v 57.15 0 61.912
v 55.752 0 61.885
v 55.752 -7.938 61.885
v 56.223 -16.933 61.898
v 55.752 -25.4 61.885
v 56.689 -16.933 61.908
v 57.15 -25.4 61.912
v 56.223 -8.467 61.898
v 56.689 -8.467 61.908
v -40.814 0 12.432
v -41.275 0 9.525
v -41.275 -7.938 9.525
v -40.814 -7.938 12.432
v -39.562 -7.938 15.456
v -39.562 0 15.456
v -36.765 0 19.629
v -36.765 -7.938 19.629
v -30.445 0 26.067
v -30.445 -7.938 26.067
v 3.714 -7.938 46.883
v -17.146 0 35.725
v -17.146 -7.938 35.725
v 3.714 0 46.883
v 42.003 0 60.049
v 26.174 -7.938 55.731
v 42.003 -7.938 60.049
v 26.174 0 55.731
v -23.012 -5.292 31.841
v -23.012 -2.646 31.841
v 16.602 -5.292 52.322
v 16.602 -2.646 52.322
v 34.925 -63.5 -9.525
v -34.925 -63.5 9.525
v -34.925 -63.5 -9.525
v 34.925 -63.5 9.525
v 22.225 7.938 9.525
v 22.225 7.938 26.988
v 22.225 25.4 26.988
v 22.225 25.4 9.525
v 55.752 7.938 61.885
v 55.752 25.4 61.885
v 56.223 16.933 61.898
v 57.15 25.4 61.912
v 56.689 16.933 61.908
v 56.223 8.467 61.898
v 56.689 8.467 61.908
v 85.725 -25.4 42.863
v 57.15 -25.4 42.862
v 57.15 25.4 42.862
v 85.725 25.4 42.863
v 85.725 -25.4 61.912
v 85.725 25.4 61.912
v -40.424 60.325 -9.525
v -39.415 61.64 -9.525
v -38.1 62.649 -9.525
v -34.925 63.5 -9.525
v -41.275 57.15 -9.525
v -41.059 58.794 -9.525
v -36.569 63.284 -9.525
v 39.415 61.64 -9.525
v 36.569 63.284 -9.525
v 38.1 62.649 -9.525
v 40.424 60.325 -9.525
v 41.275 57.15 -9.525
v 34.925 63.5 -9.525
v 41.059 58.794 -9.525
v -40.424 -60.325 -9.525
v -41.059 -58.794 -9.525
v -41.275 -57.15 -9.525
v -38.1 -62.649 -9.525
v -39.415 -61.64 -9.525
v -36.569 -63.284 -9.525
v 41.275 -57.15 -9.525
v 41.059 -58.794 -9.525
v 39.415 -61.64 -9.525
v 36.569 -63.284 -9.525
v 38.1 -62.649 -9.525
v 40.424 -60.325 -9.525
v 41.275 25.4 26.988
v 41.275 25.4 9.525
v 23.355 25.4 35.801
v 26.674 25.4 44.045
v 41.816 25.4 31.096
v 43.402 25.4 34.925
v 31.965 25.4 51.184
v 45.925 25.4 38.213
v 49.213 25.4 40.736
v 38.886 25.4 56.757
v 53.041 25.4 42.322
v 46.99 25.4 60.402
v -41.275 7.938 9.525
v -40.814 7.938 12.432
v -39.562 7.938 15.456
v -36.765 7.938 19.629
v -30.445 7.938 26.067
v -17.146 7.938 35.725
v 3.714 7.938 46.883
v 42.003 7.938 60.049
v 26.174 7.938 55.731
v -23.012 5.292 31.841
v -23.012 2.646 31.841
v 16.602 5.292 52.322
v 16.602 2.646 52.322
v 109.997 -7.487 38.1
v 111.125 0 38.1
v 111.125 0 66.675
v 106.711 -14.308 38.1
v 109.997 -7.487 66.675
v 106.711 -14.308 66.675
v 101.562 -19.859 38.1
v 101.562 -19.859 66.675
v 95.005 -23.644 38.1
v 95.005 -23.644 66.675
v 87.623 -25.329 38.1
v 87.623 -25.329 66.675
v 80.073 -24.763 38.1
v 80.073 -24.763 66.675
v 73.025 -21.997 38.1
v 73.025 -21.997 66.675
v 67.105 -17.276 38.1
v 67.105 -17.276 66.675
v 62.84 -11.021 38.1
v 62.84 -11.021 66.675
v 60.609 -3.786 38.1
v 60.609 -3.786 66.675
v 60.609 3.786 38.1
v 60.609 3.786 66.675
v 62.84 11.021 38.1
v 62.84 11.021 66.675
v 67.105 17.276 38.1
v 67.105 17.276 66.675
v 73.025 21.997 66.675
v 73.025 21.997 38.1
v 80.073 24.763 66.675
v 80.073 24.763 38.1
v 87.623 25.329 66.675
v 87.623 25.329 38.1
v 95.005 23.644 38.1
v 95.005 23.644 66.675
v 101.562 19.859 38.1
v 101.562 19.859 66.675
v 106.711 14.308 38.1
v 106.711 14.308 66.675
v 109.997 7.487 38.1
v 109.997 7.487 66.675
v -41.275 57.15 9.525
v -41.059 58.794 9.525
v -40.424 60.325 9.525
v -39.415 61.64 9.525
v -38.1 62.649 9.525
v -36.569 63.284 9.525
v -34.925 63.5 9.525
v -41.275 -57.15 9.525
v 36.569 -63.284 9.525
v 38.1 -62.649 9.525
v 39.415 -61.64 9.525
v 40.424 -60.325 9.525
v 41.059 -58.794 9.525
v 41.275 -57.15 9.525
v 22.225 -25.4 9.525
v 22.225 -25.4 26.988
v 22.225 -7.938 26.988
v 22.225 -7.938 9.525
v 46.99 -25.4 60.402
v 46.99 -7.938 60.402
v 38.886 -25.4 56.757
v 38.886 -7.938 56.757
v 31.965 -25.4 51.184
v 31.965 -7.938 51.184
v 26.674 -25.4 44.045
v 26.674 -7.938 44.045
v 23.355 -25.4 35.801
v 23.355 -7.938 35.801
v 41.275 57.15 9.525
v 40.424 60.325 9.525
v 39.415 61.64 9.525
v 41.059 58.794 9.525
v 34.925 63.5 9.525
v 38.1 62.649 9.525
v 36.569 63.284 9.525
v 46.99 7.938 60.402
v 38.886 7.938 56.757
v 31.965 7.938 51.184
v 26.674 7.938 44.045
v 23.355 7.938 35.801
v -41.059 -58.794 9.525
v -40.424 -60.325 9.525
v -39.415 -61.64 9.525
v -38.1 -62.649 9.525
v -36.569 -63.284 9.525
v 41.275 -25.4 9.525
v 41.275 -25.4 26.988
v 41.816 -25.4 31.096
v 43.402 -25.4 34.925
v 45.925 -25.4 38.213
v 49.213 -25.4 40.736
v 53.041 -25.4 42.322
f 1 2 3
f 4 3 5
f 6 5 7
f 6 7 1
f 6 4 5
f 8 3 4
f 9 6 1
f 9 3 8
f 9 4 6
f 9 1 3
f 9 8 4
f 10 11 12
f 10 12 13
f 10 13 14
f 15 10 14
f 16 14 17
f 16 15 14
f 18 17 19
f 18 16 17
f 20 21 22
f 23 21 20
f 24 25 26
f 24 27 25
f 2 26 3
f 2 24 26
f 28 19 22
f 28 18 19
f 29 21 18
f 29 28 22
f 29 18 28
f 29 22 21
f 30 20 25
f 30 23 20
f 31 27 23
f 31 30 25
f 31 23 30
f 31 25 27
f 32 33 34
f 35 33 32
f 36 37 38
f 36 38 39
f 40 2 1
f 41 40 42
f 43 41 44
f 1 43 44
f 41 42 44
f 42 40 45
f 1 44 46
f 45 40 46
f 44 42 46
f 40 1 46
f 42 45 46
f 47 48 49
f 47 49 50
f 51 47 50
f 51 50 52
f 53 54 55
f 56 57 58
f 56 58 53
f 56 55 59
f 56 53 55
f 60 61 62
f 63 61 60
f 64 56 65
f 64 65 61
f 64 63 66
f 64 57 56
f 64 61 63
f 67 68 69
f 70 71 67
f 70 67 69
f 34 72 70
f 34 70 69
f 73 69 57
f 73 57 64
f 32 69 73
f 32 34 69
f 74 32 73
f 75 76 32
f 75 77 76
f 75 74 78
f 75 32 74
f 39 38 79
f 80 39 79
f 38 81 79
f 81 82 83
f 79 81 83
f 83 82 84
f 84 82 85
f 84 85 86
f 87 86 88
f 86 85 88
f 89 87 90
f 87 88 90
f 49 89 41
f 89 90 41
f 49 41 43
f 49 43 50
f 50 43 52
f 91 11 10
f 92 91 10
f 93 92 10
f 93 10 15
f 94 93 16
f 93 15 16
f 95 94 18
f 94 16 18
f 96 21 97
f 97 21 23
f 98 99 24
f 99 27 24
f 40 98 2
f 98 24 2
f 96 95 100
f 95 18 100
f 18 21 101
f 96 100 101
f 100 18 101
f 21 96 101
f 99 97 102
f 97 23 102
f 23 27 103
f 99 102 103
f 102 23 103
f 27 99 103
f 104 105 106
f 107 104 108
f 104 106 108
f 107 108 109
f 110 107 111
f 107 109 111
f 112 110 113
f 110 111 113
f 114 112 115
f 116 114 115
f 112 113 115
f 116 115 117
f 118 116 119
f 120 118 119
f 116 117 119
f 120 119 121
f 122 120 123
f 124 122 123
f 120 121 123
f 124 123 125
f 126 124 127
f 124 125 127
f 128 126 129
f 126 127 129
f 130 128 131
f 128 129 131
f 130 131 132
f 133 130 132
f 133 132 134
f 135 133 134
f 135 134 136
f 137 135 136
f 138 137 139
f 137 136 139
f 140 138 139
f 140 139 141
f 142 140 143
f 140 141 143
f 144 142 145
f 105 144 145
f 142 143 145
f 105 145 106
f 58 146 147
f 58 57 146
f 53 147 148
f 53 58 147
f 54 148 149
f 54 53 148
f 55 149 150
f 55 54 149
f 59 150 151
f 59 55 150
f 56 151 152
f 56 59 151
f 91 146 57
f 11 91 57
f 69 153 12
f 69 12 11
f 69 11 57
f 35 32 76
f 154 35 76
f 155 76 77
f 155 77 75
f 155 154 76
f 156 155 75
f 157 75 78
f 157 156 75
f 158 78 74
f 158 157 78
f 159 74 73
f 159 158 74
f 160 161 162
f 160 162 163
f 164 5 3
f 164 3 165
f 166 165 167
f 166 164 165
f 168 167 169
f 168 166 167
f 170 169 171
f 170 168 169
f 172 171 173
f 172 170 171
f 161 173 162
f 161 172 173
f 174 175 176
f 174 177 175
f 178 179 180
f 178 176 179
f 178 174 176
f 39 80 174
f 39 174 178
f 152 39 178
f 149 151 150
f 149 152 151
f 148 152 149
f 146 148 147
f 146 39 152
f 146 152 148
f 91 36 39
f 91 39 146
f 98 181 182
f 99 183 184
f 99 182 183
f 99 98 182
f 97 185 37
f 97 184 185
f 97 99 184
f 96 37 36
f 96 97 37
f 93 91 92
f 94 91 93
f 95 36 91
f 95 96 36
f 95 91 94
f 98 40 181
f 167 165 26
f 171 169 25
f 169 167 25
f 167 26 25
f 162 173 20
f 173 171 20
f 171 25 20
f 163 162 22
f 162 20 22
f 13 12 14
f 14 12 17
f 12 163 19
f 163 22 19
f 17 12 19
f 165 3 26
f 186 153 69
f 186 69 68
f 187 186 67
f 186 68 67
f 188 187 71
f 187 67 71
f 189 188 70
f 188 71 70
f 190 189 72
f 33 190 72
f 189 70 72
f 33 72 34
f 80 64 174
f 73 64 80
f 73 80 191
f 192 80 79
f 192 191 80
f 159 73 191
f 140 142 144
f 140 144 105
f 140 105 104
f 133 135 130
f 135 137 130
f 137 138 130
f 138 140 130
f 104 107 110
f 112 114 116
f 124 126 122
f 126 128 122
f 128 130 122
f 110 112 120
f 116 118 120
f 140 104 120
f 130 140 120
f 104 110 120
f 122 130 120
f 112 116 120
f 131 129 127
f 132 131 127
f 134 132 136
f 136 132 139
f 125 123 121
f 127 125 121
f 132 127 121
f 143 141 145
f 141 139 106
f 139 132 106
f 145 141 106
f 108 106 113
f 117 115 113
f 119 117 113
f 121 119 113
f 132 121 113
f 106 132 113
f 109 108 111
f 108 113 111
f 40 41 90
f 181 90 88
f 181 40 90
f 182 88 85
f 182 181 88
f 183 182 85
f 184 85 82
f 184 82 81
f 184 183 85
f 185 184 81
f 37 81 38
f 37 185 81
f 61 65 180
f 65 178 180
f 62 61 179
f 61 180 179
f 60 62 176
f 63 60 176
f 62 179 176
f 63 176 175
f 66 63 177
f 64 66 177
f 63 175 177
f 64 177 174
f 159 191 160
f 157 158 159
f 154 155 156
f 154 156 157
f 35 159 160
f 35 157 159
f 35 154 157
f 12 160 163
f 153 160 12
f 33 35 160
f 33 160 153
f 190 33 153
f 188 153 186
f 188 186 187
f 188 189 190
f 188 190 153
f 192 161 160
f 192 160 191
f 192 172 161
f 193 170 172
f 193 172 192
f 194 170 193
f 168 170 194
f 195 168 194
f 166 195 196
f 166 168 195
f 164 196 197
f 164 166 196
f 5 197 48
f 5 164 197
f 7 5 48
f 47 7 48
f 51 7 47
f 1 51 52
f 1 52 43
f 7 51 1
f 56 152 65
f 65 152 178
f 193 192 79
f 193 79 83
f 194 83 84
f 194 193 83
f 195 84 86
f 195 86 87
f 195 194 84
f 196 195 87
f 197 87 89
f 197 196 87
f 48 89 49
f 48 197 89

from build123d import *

# Parameters (mm, degrees)
F1_DEPTH = 63.5
F0_W     = 25.4
F0_H     = 19.05
F2_DEPTH = 25.4
F3_DEPTH = 7.9375
F5_R     = 6.35


# Not quite as in the source:
# - a feature names something its author has since deleted; it is built from what else it names


with BuildPart() as f1:
    # F0 (on Front) → F1 (new body, symmetric)
    with BuildSketch(Plane.XZ):
        Polygon((22.225, 9.525), (-41.275, 9.525), (-41.275, -9.525), (41.275, -9.525), (41.275, 9.525), align=None)
    extrude(amount=F1_DEPTH, both=True)

    # F0 (on Front) → F2 (join, symmetric)
    with BuildSketch(Plane.XZ):
        with BuildLine():
            Line((22.225, 26.9875), (22.225, 9.525))
            Line((22.225, 9.525), (41.275, 9.525))
            Line((41.275, 9.525), (41.275, 26.9875))
            ThreePointArc((41.275, 26.9875), (45.9246798487, 38.2128201513), (57.15, 42.8625))
            Line((57.15, 42.8625), (60.325, 42.8625))
            Line((60.325, 42.8625), (60.325, 61.9125))
            Line((60.325, 61.9125), (57.15, 61.9125))
            add(Edge.make_bspline(
                [(55.7518836795, 61.8845041086), (56.2255175188, 61.9006022789), (56.6916659887, 61.909979921), (57.15, 61.9125)],
                knots=[109.8544384291, 109.8544384291, 109.8544384291, 109.8544384291, 111.4985685166, 111.4985685166, 111.4985685166, 111.4985685166], degree=3))
            ThreePointArc((55.7518836795, 61.8845041086), (31.9648373293, 51.1838469609), (22.225, 26.9875))
        make_face()
        with Locations((73.025, 52.3875)):
            Rectangle(F0_W, F0_H)
    extrude(amount=F2_DEPTH, both=True)

    # F0 (on Front) → F3 (join, symmetric)
    with BuildSketch(Plane.XZ):
        with BuildLine():
            add(Edge.make_bspline(
                [(-41.275, 9.525), (-40.9585584382, 29.7301590249), (24.1054952085, 60.8088863876), (55.7518836795, 61.8845041086)],
                knots=[0, 0, 0, 0, 109.8544384291, 109.8544384291, 109.8544384291, 109.8544384291], degree=3))
            Line((-41.275, 9.525), (22.225, 9.525))
            Line((22.225, 9.525), (22.225, 26.9875))
            ThreePointArc((22.225, 26.9875), (31.9648373293, 51.1838469609), (55.7518836795, 61.8845041086))
        make_face()
    extrude(amount=F3_DEPTH, both=True)

    # F5
    f5_edges = [f1.edges().sort_by_distance(p)[0] for p in [
        (41.275, -63.5, 0),
        (-41.275, -63.5, 0),
        (41.275, 63.5, 0),
        (-41.275, 63.5, 0),
    ]]
    fillet(f5_edges, radius=F5_R)


with BuildPart() as f4:
    # F0 (on Front) → F4 (revolve)
    with BuildSketch(Plane.XZ):
        Polygon((85.725, 66.675), (85.725, 61.9125), (85.725, 42.8625), (85.725, 38.1), (111.125, 38.1), (111.125, 66.675), align=None)
    revolve(axis=Axis((85.725, 0, 52.3875), (0, 0, -1)))


solid = Compound([f1.part, f4.part])
